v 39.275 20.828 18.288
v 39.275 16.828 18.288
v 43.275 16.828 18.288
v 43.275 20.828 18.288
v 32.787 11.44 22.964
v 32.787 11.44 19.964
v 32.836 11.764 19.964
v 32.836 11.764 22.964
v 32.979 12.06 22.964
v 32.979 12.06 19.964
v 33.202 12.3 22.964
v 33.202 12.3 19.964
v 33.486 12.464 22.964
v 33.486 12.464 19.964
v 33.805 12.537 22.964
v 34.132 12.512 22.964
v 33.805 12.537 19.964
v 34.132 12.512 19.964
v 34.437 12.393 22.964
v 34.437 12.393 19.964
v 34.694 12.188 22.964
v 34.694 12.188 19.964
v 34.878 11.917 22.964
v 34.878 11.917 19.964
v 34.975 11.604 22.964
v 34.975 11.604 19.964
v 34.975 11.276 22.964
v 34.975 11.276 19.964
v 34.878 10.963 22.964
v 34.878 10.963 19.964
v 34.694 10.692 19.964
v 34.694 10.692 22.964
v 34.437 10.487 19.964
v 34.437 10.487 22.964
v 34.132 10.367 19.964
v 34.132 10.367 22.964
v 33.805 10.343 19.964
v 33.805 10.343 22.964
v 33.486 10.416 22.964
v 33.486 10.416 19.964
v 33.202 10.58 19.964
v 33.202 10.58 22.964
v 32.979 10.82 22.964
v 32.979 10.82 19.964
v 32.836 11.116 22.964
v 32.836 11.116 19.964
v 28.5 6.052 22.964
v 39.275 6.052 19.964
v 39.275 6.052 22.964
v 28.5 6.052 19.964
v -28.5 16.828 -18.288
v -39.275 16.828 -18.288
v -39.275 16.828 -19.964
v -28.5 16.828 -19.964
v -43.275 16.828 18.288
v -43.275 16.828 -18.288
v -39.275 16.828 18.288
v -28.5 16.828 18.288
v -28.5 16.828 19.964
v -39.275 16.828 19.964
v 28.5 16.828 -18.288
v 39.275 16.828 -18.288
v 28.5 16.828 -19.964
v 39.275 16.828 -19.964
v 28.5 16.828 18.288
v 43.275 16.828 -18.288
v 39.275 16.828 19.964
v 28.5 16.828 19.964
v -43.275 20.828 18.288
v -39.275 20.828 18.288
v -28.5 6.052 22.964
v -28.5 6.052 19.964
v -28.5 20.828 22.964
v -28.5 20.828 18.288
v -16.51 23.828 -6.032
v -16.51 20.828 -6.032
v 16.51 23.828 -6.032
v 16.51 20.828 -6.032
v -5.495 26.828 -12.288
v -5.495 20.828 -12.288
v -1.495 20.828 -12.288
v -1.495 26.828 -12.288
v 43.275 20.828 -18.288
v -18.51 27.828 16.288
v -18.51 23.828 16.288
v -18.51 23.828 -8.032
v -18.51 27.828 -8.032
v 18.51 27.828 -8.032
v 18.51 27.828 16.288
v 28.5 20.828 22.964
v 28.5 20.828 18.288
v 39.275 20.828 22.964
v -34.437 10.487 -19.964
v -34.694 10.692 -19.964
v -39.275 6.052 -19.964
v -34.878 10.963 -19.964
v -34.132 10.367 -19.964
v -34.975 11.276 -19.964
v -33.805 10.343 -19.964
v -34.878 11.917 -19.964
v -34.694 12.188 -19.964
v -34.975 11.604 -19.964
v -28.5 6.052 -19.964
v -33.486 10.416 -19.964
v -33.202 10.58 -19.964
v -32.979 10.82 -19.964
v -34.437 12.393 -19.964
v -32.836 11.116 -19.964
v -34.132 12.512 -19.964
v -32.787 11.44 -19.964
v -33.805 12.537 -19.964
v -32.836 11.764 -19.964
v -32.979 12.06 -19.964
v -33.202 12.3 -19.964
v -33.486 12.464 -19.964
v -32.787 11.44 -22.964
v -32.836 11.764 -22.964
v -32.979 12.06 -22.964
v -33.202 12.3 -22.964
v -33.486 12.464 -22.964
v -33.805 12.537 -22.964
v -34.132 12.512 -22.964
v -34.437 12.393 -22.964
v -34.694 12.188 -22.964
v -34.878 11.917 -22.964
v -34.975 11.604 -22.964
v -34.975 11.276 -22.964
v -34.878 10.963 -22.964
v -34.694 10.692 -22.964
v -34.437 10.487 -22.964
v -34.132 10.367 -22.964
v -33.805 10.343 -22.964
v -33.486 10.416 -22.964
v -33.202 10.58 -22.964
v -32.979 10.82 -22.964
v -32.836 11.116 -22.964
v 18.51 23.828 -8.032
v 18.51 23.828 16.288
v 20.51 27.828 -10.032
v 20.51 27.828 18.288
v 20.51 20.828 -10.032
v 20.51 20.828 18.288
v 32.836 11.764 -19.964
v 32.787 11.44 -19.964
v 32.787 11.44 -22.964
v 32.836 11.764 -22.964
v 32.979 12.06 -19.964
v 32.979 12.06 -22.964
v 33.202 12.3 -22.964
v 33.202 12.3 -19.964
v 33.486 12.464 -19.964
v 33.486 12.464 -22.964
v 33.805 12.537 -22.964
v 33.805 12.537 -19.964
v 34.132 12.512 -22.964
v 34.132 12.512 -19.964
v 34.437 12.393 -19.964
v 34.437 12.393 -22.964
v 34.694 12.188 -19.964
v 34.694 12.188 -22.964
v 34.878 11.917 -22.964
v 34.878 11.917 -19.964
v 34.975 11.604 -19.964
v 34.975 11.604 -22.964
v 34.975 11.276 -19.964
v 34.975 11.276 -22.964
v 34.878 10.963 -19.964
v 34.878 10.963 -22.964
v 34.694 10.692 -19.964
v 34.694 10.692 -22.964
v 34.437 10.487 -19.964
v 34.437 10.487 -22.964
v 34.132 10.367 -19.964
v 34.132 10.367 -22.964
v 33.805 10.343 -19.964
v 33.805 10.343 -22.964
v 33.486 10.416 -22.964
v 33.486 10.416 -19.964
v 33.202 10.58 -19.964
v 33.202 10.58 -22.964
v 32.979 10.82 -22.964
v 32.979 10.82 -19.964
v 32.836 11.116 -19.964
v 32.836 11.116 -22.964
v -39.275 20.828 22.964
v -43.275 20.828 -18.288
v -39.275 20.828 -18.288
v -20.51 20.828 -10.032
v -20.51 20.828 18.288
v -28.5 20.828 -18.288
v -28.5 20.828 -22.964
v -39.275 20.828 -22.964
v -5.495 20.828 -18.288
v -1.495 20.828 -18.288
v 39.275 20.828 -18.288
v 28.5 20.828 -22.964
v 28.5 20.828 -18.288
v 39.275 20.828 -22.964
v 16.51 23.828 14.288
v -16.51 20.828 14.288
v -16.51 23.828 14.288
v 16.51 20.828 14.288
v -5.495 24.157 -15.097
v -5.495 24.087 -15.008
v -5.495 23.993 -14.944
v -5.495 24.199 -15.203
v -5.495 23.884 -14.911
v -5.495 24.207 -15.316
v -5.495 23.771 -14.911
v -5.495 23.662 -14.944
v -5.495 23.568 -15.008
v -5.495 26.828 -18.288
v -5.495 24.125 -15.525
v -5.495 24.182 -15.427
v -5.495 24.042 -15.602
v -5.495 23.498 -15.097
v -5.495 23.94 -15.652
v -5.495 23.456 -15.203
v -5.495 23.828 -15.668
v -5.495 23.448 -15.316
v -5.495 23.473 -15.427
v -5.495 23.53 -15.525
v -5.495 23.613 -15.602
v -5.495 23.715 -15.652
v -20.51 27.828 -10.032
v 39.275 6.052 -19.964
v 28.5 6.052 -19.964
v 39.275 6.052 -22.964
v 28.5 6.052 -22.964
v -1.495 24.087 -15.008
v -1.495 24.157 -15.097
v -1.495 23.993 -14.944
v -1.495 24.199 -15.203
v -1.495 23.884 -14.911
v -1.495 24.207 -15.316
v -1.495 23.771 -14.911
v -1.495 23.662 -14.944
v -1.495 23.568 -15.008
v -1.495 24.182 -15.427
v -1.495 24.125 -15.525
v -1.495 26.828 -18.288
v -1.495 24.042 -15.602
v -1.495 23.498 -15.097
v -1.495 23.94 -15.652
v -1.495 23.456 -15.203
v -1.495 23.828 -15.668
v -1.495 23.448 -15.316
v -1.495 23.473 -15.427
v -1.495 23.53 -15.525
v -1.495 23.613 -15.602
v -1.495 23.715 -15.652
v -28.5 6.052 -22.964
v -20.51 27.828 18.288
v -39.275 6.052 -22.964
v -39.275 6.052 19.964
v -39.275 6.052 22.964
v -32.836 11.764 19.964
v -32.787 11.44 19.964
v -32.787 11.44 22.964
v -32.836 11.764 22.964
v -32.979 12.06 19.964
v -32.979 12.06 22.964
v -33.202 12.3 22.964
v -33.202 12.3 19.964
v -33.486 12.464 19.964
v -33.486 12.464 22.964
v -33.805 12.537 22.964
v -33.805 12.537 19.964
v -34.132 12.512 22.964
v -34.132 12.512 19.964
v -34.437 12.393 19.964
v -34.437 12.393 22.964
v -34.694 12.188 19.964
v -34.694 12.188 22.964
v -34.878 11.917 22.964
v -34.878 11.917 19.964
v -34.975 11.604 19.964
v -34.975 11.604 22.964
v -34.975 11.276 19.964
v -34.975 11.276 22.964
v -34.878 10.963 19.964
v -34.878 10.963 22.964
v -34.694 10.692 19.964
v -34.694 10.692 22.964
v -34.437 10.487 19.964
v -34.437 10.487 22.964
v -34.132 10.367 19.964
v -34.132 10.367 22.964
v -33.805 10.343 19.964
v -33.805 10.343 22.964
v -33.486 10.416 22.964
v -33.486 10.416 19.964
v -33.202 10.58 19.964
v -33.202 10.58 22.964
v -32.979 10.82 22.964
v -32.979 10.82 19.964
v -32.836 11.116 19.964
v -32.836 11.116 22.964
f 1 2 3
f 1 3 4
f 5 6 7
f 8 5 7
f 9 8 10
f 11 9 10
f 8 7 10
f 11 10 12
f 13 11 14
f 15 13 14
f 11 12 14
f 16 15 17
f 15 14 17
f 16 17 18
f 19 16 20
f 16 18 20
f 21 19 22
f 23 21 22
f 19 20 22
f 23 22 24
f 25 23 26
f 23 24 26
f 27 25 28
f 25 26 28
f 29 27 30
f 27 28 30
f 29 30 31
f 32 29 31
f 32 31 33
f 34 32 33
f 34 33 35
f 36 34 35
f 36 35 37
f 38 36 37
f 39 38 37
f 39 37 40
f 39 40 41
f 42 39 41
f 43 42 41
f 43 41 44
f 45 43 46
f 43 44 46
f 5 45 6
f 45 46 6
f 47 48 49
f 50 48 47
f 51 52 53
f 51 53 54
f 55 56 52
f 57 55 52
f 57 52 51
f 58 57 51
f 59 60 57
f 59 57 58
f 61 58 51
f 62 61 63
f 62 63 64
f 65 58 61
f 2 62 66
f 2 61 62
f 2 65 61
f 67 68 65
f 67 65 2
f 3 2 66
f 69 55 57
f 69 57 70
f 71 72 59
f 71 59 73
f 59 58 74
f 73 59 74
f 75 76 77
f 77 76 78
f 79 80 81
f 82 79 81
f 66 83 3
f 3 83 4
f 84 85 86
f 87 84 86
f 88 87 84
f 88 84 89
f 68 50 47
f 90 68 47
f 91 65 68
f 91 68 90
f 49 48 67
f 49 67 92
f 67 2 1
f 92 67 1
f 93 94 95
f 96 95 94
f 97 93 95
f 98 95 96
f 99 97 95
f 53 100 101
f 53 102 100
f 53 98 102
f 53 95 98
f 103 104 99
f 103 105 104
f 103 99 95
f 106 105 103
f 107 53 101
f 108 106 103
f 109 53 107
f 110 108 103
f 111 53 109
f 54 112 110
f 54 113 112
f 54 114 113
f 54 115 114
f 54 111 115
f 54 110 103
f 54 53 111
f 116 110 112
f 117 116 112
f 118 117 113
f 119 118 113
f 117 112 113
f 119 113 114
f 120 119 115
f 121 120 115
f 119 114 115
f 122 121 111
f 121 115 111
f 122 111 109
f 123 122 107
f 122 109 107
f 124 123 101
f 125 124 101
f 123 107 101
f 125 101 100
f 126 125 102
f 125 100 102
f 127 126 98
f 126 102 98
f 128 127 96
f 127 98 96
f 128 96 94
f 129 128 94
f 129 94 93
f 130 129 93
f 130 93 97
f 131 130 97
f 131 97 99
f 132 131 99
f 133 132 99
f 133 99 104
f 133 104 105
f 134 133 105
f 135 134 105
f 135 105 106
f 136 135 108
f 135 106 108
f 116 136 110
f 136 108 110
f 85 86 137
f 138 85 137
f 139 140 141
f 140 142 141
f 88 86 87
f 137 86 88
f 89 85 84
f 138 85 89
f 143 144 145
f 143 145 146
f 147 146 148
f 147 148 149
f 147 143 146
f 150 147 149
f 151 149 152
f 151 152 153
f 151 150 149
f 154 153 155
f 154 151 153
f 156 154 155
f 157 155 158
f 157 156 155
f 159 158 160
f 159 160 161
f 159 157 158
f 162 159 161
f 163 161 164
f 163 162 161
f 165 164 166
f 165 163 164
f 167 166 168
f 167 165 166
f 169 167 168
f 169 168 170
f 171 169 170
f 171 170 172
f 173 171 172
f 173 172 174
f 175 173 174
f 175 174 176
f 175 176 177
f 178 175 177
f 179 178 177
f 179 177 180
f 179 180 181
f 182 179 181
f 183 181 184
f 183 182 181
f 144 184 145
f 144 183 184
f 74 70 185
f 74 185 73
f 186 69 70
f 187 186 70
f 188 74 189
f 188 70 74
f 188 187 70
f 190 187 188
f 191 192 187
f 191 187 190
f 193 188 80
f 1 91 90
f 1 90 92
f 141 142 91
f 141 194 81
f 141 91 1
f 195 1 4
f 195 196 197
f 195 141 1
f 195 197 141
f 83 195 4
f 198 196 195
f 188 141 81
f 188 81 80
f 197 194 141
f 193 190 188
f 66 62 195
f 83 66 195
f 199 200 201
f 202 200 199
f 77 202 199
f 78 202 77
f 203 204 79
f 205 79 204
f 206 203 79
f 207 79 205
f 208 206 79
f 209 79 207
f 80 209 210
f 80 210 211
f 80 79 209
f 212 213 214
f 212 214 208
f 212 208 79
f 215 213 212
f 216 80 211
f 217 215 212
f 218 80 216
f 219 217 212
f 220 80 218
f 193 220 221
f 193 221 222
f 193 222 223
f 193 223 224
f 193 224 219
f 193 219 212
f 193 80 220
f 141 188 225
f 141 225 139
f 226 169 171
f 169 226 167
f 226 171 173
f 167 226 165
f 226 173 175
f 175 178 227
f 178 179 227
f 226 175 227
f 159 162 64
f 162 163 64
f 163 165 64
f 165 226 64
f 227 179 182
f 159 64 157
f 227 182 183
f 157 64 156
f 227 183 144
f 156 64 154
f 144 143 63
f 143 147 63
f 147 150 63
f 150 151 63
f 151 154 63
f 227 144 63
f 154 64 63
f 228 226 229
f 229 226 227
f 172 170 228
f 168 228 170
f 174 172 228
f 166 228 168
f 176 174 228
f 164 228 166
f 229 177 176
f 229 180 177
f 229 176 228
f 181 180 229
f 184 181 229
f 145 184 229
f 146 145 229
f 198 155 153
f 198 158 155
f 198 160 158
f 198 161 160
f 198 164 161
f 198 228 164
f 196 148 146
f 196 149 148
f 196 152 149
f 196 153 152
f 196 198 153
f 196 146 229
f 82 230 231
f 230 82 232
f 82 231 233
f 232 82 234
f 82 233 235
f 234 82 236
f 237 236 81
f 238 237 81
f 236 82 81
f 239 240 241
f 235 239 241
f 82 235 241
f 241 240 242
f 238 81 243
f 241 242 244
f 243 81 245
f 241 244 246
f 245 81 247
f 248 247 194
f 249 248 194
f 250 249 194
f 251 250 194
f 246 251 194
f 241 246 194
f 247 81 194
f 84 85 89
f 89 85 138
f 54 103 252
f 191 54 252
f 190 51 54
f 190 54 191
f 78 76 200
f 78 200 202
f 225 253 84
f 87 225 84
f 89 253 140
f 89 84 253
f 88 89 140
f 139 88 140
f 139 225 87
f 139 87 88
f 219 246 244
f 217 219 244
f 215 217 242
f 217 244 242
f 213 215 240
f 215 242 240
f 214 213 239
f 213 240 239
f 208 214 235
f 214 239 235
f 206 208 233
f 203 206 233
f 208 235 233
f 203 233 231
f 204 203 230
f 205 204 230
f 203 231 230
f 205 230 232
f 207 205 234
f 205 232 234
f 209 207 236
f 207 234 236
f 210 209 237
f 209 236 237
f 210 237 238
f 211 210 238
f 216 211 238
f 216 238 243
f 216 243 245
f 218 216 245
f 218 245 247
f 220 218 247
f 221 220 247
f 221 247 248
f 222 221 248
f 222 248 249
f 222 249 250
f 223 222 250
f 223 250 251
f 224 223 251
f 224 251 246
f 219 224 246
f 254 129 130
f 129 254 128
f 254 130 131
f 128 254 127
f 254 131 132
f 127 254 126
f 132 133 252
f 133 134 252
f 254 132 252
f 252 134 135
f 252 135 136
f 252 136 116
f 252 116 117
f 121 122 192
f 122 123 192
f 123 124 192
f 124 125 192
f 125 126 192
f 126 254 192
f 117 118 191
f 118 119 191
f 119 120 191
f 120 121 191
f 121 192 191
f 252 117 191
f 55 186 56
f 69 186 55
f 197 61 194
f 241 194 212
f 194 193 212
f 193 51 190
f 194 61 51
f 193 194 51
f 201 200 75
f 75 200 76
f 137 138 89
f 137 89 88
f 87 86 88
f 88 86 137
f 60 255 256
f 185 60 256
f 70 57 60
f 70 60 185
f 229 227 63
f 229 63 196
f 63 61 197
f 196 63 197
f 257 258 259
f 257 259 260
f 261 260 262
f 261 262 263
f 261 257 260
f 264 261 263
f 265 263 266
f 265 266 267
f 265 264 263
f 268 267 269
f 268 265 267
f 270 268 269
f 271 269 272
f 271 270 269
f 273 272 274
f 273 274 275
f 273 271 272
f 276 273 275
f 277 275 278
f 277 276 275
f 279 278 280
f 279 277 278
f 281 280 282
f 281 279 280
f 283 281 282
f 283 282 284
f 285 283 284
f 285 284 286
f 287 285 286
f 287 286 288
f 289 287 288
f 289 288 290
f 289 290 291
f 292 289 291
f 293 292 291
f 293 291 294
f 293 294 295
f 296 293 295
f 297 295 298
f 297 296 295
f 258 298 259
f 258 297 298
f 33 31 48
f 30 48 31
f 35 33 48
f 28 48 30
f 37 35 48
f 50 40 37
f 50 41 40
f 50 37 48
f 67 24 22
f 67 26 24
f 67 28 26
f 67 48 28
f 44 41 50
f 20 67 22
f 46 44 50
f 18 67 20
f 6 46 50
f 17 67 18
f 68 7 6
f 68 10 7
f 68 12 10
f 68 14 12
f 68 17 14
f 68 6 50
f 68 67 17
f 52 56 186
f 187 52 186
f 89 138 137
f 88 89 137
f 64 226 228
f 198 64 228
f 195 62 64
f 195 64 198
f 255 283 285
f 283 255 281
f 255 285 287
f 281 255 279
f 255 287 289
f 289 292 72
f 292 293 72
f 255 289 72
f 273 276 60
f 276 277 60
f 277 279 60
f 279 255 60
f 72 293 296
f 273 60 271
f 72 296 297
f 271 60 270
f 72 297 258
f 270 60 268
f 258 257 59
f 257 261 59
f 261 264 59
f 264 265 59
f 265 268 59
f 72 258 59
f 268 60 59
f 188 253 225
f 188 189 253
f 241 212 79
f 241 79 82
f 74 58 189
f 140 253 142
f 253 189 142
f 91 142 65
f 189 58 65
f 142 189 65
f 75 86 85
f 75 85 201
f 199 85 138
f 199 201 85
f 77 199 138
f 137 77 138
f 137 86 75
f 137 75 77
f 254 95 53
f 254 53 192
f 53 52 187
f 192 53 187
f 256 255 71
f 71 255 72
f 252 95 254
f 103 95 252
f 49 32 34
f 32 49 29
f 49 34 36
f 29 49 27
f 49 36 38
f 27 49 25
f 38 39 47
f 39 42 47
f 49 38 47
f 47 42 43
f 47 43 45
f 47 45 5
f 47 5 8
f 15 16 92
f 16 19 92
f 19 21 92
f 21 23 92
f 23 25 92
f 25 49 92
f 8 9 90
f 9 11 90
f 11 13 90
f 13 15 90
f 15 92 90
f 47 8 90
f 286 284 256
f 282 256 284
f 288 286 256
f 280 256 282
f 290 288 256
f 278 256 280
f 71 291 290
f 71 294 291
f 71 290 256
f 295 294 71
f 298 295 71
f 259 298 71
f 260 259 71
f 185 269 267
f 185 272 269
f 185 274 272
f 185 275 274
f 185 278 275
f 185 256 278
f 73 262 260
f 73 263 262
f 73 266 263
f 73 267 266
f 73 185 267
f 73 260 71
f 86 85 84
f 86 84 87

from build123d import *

# Parameters (mm, degrees)
SKETCH1_W               = 36.575
SKETCH1_H               = 41.655
SKETCH1_W_2             = 28.575
SKETCH1_H_2             = 33.655
BOSS_EXTRUDE1_DEPTH     = 41.275
SKETCH2_W               = 36.575
SKETCH2_H               = 41.655
BOSS_EXTRUDE2_DEPTH     = 2
SKETCH4_W               = 86.55
SKETCH4_H               = 36.575
CUT_EXTRUDE2_DEPTH      = 37.655
SKETCH5_W               = 10.7752
SKETCH5_H               = 4
BOSS_EXTRUDE3_DEPTH     = 1.6764
SKETCH6_W               = 10.7752
SKETCH6_H               = 14.7752
SKETCH6_R               = 1.1
BOSS_EXTRUDE4_DEPTH     = 3
MIRROR3_COPY_1_SKETCH_W = 10.7752
MIRROR3_COPY_1_SKETCH_H = 4
MIRROR3_COPY_1_DEPTH    = 1.6764
MIRROR3_COPY_2_SKETCH_W = 10.7752
MIRROR3_COPY_2_SKETCH_H = 14.7752
MIRROR3_COPY_2_SKETCH_R = 1.1
MIRROR3_COPY_2_DEPTH    = 3
SKETCH7_W               = 4
SKETCH7_H               = 6
BOSS_EXTRUDE5_DEPTH     = 6
SKETCH8_R               = 0.381
CUT_EXTRUDE3_DEPTH      = 58.021122047
SKETCH9_W               = 41.02
SKETCH9_H               = 28.32
SKETCH9_W_2             = 33.02
SKETCH9_H_2             = 20.32
BOSS_EXTRUDE6_DEPTH     = 3
SKETCH10_W              = 41.02
SKETCH10_H              = 28.32
SKETCH10_W_2            = 37.02
SKETCH10_H_2            = 24.32
BOSS_EXTRUDE7_DEPTH     = 4
SKETCH11_W              = 37.02
SKETCH11_H              = 24.32
BOSS_EXTRUDE8_DEPTH     = 4


with BuildPart() as part:
    # Sketch1 → Boss-Extrude1 (new, symmetric)
    with BuildSketch(Plane(origin=(0, 0, 0), x_dir=(0, 0, -1), z_dir=(1, 0, 0))):
        Rectangle(SKETCH1_W, SKETCH1_H)
        Rectangle(SKETCH1_W_2, SKETCH1_H_2, mode=Mode.SUBTRACT)
    extrude(amount=BOSS_EXTRUDE1_DEPTH, both=True)

    # Sketch2 → Boss-Extrude2 (add)
    with BuildSketch(Plane.ZY.offset(41.275)):
        Rectangle(SKETCH2_W, SKETCH2_H)
    boss_extrude2 = extrude(amount=BOSS_EXTRUDE2_DEPTH)

    # Mirror1: Boss-Extrude2 across plane
    add(boss_extrude2.mirror(Plane(origin=(0, 0, 0), x_dir=(0, 0, 1), z_dir=(1, 0, 0))))

    # Sketch4 → Cut-Extrude2 (cut)
    with BuildSketch(Plane.XZ.offset(20.8275)):
        Rectangle(SKETCH4_W, SKETCH4_H)
    extrude(amount=-CUT_EXTRUDE2_DEPTH, mode=Mode.SUBTRACT)

    # Sketch5 → Boss-Extrude3 (add)
    with BuildSketch(Plane(origin=(0, 0, -18.2875), x_dir=(-1, 0, 0), z_dir=(0, 0, -1))):
        with Locations((-33.8874, 18.8275)):
            Rectangle(SKETCH5_W, SKETCH5_H)
    boss_extrude3 = extrude(amount=BOSS_EXTRUDE3_DEPTH)

    # Sketch6 → Boss-Extrude4 (add)
    with BuildSketch(Plane(origin=(0, 0, -19.9639), x_dir=(-1, 0, 0), z_dir=(0, 0, -1))):
        with Locations((-33.8874, 13.4399)):
            Rectangle(SKETCH6_W, SKETCH6_H)
        with Locations((-33.8874, 11.4399)):
            Circle(SKETCH6_R, mode=Mode.SUBTRACT)
    boss_extrude4 = extrude(amount=BOSS_EXTRUDE4_DEPTH)

    # Mirror2: Boss-Extrude3, Boss-Extrude4 across plane
    add(boss_extrude3.mirror(Plane(origin=(0, 0, 0), x_dir=(0, 0, 1), z_dir=(1, 0, 0))))
    add(boss_extrude4.mirror(Plane(origin=(0, 0, 0), x_dir=(0, 0, 1), z_dir=(1, 0, 0))))

    # Mirror3: Boss-Extrude3, Boss-Extrude4 across plane
    add(boss_extrude3.mirror(Plane.XY))
    add(boss_extrude4.mirror(Plane.XY))

    # Mirror3 copy 1 sketch → Mirror3 copy 1 (add)
    with BuildSketch(Plane.XY.offset(18.2875)):
        with Locations((-33.8874, 18.8275)):
            Rectangle(MIRROR3_COPY_1_SKETCH_W, MIRROR3_COPY_1_SKETCH_H)
    extrude(amount=MIRROR3_COPY_1_DEPTH)

    # Mirror3 copy 2 sketch → Mirror3 copy 2 (add)
    with BuildSketch(Plane.XY.offset(19.9639)):
        with Locations((-33.8874, 13.4399)):
            Rectangle(MIRROR3_COPY_2_SKETCH_W, MIRROR3_COPY_2_SKETCH_H)
        with Locations((-33.8874, 11.4399)):
            Circle(MIRROR3_COPY_2_SKETCH_R, mode=Mode.SUBTRACT)
    extrude(amount=MIRROR3_COPY_2_DEPTH)

    # Sketch7 → Boss-Extrude5 (add)
    with BuildSketch(Plane(origin=(0, 20.8275, 0), x_dir=(1, 0, 0), z_dir=(0, 1, 0))):
        with Locations((-3.495, 15.2875)):
            Rectangle(SKETCH7_W, SKETCH7_H)
    extrude(amount=BOSS_EXTRUDE5_DEPTH)

    # Sketch8 → Cut-Extrude3 (cut, through all)
    with BuildSketch(Plane(origin=(-1.495, 0, 0), x_dir=(0, 0, -1), z_dir=(1, 0, 0))):
        with Locations((15.2875, 23.8275)):
            Circle(SKETCH8_R)
    extrude(amount=-CUT_EXTRUDE3_DEPTH, mode=Mode.SUBTRACT)

    # Sketch9 → Boss-Extrude6 (add)
    with BuildSketch(Plane(origin=(0, 20.8275, 0), x_dir=(1, 0, 0), z_dir=(0, 1, 0))):
        with Locations((0, -4.1275)):
            Rectangle(SKETCH9_W, SKETCH9_H)
        with Locations((0, -4.1275)):
            Rectangle(SKETCH9_W_2, SKETCH9_H_2, mode=Mode.SUBTRACT)
    extrude(amount=BOSS_EXTRUDE6_DEPTH)

    # Sketch10 → Boss-Extrude7 (add)
    with BuildSketch(Plane(origin=(0, 23.8275, 0), x_dir=(1, 0, 0), z_dir=(0, 1, 0))):
        with Locations((0, -4.1275)):
            Rectangle(SKETCH10_W, SKETCH10_H)
        with Locations((0, -4.1275)):
            Rectangle(SKETCH10_W_2, SKETCH10_H_2, mode=Mode.SUBTRACT)
    extrude(amount=BOSS_EXTRUDE7_DEPTH)


with BuildPart() as body_2:
    # Sketch11 → Boss-Extrude8 (new body)
    with BuildSketch(Plane(origin=(0, 23.8275, 0), x_dir=(1, 0, 0), z_dir=(0, 1, 0))):
        with Locations((0, -4.1275)):
            Rectangle(SKETCH11_W, SKETCH11_H)
    extrude(amount=BOSS_EXTRUDE8_DEPTH)


solid = Compound([part.part, body_2.part])
